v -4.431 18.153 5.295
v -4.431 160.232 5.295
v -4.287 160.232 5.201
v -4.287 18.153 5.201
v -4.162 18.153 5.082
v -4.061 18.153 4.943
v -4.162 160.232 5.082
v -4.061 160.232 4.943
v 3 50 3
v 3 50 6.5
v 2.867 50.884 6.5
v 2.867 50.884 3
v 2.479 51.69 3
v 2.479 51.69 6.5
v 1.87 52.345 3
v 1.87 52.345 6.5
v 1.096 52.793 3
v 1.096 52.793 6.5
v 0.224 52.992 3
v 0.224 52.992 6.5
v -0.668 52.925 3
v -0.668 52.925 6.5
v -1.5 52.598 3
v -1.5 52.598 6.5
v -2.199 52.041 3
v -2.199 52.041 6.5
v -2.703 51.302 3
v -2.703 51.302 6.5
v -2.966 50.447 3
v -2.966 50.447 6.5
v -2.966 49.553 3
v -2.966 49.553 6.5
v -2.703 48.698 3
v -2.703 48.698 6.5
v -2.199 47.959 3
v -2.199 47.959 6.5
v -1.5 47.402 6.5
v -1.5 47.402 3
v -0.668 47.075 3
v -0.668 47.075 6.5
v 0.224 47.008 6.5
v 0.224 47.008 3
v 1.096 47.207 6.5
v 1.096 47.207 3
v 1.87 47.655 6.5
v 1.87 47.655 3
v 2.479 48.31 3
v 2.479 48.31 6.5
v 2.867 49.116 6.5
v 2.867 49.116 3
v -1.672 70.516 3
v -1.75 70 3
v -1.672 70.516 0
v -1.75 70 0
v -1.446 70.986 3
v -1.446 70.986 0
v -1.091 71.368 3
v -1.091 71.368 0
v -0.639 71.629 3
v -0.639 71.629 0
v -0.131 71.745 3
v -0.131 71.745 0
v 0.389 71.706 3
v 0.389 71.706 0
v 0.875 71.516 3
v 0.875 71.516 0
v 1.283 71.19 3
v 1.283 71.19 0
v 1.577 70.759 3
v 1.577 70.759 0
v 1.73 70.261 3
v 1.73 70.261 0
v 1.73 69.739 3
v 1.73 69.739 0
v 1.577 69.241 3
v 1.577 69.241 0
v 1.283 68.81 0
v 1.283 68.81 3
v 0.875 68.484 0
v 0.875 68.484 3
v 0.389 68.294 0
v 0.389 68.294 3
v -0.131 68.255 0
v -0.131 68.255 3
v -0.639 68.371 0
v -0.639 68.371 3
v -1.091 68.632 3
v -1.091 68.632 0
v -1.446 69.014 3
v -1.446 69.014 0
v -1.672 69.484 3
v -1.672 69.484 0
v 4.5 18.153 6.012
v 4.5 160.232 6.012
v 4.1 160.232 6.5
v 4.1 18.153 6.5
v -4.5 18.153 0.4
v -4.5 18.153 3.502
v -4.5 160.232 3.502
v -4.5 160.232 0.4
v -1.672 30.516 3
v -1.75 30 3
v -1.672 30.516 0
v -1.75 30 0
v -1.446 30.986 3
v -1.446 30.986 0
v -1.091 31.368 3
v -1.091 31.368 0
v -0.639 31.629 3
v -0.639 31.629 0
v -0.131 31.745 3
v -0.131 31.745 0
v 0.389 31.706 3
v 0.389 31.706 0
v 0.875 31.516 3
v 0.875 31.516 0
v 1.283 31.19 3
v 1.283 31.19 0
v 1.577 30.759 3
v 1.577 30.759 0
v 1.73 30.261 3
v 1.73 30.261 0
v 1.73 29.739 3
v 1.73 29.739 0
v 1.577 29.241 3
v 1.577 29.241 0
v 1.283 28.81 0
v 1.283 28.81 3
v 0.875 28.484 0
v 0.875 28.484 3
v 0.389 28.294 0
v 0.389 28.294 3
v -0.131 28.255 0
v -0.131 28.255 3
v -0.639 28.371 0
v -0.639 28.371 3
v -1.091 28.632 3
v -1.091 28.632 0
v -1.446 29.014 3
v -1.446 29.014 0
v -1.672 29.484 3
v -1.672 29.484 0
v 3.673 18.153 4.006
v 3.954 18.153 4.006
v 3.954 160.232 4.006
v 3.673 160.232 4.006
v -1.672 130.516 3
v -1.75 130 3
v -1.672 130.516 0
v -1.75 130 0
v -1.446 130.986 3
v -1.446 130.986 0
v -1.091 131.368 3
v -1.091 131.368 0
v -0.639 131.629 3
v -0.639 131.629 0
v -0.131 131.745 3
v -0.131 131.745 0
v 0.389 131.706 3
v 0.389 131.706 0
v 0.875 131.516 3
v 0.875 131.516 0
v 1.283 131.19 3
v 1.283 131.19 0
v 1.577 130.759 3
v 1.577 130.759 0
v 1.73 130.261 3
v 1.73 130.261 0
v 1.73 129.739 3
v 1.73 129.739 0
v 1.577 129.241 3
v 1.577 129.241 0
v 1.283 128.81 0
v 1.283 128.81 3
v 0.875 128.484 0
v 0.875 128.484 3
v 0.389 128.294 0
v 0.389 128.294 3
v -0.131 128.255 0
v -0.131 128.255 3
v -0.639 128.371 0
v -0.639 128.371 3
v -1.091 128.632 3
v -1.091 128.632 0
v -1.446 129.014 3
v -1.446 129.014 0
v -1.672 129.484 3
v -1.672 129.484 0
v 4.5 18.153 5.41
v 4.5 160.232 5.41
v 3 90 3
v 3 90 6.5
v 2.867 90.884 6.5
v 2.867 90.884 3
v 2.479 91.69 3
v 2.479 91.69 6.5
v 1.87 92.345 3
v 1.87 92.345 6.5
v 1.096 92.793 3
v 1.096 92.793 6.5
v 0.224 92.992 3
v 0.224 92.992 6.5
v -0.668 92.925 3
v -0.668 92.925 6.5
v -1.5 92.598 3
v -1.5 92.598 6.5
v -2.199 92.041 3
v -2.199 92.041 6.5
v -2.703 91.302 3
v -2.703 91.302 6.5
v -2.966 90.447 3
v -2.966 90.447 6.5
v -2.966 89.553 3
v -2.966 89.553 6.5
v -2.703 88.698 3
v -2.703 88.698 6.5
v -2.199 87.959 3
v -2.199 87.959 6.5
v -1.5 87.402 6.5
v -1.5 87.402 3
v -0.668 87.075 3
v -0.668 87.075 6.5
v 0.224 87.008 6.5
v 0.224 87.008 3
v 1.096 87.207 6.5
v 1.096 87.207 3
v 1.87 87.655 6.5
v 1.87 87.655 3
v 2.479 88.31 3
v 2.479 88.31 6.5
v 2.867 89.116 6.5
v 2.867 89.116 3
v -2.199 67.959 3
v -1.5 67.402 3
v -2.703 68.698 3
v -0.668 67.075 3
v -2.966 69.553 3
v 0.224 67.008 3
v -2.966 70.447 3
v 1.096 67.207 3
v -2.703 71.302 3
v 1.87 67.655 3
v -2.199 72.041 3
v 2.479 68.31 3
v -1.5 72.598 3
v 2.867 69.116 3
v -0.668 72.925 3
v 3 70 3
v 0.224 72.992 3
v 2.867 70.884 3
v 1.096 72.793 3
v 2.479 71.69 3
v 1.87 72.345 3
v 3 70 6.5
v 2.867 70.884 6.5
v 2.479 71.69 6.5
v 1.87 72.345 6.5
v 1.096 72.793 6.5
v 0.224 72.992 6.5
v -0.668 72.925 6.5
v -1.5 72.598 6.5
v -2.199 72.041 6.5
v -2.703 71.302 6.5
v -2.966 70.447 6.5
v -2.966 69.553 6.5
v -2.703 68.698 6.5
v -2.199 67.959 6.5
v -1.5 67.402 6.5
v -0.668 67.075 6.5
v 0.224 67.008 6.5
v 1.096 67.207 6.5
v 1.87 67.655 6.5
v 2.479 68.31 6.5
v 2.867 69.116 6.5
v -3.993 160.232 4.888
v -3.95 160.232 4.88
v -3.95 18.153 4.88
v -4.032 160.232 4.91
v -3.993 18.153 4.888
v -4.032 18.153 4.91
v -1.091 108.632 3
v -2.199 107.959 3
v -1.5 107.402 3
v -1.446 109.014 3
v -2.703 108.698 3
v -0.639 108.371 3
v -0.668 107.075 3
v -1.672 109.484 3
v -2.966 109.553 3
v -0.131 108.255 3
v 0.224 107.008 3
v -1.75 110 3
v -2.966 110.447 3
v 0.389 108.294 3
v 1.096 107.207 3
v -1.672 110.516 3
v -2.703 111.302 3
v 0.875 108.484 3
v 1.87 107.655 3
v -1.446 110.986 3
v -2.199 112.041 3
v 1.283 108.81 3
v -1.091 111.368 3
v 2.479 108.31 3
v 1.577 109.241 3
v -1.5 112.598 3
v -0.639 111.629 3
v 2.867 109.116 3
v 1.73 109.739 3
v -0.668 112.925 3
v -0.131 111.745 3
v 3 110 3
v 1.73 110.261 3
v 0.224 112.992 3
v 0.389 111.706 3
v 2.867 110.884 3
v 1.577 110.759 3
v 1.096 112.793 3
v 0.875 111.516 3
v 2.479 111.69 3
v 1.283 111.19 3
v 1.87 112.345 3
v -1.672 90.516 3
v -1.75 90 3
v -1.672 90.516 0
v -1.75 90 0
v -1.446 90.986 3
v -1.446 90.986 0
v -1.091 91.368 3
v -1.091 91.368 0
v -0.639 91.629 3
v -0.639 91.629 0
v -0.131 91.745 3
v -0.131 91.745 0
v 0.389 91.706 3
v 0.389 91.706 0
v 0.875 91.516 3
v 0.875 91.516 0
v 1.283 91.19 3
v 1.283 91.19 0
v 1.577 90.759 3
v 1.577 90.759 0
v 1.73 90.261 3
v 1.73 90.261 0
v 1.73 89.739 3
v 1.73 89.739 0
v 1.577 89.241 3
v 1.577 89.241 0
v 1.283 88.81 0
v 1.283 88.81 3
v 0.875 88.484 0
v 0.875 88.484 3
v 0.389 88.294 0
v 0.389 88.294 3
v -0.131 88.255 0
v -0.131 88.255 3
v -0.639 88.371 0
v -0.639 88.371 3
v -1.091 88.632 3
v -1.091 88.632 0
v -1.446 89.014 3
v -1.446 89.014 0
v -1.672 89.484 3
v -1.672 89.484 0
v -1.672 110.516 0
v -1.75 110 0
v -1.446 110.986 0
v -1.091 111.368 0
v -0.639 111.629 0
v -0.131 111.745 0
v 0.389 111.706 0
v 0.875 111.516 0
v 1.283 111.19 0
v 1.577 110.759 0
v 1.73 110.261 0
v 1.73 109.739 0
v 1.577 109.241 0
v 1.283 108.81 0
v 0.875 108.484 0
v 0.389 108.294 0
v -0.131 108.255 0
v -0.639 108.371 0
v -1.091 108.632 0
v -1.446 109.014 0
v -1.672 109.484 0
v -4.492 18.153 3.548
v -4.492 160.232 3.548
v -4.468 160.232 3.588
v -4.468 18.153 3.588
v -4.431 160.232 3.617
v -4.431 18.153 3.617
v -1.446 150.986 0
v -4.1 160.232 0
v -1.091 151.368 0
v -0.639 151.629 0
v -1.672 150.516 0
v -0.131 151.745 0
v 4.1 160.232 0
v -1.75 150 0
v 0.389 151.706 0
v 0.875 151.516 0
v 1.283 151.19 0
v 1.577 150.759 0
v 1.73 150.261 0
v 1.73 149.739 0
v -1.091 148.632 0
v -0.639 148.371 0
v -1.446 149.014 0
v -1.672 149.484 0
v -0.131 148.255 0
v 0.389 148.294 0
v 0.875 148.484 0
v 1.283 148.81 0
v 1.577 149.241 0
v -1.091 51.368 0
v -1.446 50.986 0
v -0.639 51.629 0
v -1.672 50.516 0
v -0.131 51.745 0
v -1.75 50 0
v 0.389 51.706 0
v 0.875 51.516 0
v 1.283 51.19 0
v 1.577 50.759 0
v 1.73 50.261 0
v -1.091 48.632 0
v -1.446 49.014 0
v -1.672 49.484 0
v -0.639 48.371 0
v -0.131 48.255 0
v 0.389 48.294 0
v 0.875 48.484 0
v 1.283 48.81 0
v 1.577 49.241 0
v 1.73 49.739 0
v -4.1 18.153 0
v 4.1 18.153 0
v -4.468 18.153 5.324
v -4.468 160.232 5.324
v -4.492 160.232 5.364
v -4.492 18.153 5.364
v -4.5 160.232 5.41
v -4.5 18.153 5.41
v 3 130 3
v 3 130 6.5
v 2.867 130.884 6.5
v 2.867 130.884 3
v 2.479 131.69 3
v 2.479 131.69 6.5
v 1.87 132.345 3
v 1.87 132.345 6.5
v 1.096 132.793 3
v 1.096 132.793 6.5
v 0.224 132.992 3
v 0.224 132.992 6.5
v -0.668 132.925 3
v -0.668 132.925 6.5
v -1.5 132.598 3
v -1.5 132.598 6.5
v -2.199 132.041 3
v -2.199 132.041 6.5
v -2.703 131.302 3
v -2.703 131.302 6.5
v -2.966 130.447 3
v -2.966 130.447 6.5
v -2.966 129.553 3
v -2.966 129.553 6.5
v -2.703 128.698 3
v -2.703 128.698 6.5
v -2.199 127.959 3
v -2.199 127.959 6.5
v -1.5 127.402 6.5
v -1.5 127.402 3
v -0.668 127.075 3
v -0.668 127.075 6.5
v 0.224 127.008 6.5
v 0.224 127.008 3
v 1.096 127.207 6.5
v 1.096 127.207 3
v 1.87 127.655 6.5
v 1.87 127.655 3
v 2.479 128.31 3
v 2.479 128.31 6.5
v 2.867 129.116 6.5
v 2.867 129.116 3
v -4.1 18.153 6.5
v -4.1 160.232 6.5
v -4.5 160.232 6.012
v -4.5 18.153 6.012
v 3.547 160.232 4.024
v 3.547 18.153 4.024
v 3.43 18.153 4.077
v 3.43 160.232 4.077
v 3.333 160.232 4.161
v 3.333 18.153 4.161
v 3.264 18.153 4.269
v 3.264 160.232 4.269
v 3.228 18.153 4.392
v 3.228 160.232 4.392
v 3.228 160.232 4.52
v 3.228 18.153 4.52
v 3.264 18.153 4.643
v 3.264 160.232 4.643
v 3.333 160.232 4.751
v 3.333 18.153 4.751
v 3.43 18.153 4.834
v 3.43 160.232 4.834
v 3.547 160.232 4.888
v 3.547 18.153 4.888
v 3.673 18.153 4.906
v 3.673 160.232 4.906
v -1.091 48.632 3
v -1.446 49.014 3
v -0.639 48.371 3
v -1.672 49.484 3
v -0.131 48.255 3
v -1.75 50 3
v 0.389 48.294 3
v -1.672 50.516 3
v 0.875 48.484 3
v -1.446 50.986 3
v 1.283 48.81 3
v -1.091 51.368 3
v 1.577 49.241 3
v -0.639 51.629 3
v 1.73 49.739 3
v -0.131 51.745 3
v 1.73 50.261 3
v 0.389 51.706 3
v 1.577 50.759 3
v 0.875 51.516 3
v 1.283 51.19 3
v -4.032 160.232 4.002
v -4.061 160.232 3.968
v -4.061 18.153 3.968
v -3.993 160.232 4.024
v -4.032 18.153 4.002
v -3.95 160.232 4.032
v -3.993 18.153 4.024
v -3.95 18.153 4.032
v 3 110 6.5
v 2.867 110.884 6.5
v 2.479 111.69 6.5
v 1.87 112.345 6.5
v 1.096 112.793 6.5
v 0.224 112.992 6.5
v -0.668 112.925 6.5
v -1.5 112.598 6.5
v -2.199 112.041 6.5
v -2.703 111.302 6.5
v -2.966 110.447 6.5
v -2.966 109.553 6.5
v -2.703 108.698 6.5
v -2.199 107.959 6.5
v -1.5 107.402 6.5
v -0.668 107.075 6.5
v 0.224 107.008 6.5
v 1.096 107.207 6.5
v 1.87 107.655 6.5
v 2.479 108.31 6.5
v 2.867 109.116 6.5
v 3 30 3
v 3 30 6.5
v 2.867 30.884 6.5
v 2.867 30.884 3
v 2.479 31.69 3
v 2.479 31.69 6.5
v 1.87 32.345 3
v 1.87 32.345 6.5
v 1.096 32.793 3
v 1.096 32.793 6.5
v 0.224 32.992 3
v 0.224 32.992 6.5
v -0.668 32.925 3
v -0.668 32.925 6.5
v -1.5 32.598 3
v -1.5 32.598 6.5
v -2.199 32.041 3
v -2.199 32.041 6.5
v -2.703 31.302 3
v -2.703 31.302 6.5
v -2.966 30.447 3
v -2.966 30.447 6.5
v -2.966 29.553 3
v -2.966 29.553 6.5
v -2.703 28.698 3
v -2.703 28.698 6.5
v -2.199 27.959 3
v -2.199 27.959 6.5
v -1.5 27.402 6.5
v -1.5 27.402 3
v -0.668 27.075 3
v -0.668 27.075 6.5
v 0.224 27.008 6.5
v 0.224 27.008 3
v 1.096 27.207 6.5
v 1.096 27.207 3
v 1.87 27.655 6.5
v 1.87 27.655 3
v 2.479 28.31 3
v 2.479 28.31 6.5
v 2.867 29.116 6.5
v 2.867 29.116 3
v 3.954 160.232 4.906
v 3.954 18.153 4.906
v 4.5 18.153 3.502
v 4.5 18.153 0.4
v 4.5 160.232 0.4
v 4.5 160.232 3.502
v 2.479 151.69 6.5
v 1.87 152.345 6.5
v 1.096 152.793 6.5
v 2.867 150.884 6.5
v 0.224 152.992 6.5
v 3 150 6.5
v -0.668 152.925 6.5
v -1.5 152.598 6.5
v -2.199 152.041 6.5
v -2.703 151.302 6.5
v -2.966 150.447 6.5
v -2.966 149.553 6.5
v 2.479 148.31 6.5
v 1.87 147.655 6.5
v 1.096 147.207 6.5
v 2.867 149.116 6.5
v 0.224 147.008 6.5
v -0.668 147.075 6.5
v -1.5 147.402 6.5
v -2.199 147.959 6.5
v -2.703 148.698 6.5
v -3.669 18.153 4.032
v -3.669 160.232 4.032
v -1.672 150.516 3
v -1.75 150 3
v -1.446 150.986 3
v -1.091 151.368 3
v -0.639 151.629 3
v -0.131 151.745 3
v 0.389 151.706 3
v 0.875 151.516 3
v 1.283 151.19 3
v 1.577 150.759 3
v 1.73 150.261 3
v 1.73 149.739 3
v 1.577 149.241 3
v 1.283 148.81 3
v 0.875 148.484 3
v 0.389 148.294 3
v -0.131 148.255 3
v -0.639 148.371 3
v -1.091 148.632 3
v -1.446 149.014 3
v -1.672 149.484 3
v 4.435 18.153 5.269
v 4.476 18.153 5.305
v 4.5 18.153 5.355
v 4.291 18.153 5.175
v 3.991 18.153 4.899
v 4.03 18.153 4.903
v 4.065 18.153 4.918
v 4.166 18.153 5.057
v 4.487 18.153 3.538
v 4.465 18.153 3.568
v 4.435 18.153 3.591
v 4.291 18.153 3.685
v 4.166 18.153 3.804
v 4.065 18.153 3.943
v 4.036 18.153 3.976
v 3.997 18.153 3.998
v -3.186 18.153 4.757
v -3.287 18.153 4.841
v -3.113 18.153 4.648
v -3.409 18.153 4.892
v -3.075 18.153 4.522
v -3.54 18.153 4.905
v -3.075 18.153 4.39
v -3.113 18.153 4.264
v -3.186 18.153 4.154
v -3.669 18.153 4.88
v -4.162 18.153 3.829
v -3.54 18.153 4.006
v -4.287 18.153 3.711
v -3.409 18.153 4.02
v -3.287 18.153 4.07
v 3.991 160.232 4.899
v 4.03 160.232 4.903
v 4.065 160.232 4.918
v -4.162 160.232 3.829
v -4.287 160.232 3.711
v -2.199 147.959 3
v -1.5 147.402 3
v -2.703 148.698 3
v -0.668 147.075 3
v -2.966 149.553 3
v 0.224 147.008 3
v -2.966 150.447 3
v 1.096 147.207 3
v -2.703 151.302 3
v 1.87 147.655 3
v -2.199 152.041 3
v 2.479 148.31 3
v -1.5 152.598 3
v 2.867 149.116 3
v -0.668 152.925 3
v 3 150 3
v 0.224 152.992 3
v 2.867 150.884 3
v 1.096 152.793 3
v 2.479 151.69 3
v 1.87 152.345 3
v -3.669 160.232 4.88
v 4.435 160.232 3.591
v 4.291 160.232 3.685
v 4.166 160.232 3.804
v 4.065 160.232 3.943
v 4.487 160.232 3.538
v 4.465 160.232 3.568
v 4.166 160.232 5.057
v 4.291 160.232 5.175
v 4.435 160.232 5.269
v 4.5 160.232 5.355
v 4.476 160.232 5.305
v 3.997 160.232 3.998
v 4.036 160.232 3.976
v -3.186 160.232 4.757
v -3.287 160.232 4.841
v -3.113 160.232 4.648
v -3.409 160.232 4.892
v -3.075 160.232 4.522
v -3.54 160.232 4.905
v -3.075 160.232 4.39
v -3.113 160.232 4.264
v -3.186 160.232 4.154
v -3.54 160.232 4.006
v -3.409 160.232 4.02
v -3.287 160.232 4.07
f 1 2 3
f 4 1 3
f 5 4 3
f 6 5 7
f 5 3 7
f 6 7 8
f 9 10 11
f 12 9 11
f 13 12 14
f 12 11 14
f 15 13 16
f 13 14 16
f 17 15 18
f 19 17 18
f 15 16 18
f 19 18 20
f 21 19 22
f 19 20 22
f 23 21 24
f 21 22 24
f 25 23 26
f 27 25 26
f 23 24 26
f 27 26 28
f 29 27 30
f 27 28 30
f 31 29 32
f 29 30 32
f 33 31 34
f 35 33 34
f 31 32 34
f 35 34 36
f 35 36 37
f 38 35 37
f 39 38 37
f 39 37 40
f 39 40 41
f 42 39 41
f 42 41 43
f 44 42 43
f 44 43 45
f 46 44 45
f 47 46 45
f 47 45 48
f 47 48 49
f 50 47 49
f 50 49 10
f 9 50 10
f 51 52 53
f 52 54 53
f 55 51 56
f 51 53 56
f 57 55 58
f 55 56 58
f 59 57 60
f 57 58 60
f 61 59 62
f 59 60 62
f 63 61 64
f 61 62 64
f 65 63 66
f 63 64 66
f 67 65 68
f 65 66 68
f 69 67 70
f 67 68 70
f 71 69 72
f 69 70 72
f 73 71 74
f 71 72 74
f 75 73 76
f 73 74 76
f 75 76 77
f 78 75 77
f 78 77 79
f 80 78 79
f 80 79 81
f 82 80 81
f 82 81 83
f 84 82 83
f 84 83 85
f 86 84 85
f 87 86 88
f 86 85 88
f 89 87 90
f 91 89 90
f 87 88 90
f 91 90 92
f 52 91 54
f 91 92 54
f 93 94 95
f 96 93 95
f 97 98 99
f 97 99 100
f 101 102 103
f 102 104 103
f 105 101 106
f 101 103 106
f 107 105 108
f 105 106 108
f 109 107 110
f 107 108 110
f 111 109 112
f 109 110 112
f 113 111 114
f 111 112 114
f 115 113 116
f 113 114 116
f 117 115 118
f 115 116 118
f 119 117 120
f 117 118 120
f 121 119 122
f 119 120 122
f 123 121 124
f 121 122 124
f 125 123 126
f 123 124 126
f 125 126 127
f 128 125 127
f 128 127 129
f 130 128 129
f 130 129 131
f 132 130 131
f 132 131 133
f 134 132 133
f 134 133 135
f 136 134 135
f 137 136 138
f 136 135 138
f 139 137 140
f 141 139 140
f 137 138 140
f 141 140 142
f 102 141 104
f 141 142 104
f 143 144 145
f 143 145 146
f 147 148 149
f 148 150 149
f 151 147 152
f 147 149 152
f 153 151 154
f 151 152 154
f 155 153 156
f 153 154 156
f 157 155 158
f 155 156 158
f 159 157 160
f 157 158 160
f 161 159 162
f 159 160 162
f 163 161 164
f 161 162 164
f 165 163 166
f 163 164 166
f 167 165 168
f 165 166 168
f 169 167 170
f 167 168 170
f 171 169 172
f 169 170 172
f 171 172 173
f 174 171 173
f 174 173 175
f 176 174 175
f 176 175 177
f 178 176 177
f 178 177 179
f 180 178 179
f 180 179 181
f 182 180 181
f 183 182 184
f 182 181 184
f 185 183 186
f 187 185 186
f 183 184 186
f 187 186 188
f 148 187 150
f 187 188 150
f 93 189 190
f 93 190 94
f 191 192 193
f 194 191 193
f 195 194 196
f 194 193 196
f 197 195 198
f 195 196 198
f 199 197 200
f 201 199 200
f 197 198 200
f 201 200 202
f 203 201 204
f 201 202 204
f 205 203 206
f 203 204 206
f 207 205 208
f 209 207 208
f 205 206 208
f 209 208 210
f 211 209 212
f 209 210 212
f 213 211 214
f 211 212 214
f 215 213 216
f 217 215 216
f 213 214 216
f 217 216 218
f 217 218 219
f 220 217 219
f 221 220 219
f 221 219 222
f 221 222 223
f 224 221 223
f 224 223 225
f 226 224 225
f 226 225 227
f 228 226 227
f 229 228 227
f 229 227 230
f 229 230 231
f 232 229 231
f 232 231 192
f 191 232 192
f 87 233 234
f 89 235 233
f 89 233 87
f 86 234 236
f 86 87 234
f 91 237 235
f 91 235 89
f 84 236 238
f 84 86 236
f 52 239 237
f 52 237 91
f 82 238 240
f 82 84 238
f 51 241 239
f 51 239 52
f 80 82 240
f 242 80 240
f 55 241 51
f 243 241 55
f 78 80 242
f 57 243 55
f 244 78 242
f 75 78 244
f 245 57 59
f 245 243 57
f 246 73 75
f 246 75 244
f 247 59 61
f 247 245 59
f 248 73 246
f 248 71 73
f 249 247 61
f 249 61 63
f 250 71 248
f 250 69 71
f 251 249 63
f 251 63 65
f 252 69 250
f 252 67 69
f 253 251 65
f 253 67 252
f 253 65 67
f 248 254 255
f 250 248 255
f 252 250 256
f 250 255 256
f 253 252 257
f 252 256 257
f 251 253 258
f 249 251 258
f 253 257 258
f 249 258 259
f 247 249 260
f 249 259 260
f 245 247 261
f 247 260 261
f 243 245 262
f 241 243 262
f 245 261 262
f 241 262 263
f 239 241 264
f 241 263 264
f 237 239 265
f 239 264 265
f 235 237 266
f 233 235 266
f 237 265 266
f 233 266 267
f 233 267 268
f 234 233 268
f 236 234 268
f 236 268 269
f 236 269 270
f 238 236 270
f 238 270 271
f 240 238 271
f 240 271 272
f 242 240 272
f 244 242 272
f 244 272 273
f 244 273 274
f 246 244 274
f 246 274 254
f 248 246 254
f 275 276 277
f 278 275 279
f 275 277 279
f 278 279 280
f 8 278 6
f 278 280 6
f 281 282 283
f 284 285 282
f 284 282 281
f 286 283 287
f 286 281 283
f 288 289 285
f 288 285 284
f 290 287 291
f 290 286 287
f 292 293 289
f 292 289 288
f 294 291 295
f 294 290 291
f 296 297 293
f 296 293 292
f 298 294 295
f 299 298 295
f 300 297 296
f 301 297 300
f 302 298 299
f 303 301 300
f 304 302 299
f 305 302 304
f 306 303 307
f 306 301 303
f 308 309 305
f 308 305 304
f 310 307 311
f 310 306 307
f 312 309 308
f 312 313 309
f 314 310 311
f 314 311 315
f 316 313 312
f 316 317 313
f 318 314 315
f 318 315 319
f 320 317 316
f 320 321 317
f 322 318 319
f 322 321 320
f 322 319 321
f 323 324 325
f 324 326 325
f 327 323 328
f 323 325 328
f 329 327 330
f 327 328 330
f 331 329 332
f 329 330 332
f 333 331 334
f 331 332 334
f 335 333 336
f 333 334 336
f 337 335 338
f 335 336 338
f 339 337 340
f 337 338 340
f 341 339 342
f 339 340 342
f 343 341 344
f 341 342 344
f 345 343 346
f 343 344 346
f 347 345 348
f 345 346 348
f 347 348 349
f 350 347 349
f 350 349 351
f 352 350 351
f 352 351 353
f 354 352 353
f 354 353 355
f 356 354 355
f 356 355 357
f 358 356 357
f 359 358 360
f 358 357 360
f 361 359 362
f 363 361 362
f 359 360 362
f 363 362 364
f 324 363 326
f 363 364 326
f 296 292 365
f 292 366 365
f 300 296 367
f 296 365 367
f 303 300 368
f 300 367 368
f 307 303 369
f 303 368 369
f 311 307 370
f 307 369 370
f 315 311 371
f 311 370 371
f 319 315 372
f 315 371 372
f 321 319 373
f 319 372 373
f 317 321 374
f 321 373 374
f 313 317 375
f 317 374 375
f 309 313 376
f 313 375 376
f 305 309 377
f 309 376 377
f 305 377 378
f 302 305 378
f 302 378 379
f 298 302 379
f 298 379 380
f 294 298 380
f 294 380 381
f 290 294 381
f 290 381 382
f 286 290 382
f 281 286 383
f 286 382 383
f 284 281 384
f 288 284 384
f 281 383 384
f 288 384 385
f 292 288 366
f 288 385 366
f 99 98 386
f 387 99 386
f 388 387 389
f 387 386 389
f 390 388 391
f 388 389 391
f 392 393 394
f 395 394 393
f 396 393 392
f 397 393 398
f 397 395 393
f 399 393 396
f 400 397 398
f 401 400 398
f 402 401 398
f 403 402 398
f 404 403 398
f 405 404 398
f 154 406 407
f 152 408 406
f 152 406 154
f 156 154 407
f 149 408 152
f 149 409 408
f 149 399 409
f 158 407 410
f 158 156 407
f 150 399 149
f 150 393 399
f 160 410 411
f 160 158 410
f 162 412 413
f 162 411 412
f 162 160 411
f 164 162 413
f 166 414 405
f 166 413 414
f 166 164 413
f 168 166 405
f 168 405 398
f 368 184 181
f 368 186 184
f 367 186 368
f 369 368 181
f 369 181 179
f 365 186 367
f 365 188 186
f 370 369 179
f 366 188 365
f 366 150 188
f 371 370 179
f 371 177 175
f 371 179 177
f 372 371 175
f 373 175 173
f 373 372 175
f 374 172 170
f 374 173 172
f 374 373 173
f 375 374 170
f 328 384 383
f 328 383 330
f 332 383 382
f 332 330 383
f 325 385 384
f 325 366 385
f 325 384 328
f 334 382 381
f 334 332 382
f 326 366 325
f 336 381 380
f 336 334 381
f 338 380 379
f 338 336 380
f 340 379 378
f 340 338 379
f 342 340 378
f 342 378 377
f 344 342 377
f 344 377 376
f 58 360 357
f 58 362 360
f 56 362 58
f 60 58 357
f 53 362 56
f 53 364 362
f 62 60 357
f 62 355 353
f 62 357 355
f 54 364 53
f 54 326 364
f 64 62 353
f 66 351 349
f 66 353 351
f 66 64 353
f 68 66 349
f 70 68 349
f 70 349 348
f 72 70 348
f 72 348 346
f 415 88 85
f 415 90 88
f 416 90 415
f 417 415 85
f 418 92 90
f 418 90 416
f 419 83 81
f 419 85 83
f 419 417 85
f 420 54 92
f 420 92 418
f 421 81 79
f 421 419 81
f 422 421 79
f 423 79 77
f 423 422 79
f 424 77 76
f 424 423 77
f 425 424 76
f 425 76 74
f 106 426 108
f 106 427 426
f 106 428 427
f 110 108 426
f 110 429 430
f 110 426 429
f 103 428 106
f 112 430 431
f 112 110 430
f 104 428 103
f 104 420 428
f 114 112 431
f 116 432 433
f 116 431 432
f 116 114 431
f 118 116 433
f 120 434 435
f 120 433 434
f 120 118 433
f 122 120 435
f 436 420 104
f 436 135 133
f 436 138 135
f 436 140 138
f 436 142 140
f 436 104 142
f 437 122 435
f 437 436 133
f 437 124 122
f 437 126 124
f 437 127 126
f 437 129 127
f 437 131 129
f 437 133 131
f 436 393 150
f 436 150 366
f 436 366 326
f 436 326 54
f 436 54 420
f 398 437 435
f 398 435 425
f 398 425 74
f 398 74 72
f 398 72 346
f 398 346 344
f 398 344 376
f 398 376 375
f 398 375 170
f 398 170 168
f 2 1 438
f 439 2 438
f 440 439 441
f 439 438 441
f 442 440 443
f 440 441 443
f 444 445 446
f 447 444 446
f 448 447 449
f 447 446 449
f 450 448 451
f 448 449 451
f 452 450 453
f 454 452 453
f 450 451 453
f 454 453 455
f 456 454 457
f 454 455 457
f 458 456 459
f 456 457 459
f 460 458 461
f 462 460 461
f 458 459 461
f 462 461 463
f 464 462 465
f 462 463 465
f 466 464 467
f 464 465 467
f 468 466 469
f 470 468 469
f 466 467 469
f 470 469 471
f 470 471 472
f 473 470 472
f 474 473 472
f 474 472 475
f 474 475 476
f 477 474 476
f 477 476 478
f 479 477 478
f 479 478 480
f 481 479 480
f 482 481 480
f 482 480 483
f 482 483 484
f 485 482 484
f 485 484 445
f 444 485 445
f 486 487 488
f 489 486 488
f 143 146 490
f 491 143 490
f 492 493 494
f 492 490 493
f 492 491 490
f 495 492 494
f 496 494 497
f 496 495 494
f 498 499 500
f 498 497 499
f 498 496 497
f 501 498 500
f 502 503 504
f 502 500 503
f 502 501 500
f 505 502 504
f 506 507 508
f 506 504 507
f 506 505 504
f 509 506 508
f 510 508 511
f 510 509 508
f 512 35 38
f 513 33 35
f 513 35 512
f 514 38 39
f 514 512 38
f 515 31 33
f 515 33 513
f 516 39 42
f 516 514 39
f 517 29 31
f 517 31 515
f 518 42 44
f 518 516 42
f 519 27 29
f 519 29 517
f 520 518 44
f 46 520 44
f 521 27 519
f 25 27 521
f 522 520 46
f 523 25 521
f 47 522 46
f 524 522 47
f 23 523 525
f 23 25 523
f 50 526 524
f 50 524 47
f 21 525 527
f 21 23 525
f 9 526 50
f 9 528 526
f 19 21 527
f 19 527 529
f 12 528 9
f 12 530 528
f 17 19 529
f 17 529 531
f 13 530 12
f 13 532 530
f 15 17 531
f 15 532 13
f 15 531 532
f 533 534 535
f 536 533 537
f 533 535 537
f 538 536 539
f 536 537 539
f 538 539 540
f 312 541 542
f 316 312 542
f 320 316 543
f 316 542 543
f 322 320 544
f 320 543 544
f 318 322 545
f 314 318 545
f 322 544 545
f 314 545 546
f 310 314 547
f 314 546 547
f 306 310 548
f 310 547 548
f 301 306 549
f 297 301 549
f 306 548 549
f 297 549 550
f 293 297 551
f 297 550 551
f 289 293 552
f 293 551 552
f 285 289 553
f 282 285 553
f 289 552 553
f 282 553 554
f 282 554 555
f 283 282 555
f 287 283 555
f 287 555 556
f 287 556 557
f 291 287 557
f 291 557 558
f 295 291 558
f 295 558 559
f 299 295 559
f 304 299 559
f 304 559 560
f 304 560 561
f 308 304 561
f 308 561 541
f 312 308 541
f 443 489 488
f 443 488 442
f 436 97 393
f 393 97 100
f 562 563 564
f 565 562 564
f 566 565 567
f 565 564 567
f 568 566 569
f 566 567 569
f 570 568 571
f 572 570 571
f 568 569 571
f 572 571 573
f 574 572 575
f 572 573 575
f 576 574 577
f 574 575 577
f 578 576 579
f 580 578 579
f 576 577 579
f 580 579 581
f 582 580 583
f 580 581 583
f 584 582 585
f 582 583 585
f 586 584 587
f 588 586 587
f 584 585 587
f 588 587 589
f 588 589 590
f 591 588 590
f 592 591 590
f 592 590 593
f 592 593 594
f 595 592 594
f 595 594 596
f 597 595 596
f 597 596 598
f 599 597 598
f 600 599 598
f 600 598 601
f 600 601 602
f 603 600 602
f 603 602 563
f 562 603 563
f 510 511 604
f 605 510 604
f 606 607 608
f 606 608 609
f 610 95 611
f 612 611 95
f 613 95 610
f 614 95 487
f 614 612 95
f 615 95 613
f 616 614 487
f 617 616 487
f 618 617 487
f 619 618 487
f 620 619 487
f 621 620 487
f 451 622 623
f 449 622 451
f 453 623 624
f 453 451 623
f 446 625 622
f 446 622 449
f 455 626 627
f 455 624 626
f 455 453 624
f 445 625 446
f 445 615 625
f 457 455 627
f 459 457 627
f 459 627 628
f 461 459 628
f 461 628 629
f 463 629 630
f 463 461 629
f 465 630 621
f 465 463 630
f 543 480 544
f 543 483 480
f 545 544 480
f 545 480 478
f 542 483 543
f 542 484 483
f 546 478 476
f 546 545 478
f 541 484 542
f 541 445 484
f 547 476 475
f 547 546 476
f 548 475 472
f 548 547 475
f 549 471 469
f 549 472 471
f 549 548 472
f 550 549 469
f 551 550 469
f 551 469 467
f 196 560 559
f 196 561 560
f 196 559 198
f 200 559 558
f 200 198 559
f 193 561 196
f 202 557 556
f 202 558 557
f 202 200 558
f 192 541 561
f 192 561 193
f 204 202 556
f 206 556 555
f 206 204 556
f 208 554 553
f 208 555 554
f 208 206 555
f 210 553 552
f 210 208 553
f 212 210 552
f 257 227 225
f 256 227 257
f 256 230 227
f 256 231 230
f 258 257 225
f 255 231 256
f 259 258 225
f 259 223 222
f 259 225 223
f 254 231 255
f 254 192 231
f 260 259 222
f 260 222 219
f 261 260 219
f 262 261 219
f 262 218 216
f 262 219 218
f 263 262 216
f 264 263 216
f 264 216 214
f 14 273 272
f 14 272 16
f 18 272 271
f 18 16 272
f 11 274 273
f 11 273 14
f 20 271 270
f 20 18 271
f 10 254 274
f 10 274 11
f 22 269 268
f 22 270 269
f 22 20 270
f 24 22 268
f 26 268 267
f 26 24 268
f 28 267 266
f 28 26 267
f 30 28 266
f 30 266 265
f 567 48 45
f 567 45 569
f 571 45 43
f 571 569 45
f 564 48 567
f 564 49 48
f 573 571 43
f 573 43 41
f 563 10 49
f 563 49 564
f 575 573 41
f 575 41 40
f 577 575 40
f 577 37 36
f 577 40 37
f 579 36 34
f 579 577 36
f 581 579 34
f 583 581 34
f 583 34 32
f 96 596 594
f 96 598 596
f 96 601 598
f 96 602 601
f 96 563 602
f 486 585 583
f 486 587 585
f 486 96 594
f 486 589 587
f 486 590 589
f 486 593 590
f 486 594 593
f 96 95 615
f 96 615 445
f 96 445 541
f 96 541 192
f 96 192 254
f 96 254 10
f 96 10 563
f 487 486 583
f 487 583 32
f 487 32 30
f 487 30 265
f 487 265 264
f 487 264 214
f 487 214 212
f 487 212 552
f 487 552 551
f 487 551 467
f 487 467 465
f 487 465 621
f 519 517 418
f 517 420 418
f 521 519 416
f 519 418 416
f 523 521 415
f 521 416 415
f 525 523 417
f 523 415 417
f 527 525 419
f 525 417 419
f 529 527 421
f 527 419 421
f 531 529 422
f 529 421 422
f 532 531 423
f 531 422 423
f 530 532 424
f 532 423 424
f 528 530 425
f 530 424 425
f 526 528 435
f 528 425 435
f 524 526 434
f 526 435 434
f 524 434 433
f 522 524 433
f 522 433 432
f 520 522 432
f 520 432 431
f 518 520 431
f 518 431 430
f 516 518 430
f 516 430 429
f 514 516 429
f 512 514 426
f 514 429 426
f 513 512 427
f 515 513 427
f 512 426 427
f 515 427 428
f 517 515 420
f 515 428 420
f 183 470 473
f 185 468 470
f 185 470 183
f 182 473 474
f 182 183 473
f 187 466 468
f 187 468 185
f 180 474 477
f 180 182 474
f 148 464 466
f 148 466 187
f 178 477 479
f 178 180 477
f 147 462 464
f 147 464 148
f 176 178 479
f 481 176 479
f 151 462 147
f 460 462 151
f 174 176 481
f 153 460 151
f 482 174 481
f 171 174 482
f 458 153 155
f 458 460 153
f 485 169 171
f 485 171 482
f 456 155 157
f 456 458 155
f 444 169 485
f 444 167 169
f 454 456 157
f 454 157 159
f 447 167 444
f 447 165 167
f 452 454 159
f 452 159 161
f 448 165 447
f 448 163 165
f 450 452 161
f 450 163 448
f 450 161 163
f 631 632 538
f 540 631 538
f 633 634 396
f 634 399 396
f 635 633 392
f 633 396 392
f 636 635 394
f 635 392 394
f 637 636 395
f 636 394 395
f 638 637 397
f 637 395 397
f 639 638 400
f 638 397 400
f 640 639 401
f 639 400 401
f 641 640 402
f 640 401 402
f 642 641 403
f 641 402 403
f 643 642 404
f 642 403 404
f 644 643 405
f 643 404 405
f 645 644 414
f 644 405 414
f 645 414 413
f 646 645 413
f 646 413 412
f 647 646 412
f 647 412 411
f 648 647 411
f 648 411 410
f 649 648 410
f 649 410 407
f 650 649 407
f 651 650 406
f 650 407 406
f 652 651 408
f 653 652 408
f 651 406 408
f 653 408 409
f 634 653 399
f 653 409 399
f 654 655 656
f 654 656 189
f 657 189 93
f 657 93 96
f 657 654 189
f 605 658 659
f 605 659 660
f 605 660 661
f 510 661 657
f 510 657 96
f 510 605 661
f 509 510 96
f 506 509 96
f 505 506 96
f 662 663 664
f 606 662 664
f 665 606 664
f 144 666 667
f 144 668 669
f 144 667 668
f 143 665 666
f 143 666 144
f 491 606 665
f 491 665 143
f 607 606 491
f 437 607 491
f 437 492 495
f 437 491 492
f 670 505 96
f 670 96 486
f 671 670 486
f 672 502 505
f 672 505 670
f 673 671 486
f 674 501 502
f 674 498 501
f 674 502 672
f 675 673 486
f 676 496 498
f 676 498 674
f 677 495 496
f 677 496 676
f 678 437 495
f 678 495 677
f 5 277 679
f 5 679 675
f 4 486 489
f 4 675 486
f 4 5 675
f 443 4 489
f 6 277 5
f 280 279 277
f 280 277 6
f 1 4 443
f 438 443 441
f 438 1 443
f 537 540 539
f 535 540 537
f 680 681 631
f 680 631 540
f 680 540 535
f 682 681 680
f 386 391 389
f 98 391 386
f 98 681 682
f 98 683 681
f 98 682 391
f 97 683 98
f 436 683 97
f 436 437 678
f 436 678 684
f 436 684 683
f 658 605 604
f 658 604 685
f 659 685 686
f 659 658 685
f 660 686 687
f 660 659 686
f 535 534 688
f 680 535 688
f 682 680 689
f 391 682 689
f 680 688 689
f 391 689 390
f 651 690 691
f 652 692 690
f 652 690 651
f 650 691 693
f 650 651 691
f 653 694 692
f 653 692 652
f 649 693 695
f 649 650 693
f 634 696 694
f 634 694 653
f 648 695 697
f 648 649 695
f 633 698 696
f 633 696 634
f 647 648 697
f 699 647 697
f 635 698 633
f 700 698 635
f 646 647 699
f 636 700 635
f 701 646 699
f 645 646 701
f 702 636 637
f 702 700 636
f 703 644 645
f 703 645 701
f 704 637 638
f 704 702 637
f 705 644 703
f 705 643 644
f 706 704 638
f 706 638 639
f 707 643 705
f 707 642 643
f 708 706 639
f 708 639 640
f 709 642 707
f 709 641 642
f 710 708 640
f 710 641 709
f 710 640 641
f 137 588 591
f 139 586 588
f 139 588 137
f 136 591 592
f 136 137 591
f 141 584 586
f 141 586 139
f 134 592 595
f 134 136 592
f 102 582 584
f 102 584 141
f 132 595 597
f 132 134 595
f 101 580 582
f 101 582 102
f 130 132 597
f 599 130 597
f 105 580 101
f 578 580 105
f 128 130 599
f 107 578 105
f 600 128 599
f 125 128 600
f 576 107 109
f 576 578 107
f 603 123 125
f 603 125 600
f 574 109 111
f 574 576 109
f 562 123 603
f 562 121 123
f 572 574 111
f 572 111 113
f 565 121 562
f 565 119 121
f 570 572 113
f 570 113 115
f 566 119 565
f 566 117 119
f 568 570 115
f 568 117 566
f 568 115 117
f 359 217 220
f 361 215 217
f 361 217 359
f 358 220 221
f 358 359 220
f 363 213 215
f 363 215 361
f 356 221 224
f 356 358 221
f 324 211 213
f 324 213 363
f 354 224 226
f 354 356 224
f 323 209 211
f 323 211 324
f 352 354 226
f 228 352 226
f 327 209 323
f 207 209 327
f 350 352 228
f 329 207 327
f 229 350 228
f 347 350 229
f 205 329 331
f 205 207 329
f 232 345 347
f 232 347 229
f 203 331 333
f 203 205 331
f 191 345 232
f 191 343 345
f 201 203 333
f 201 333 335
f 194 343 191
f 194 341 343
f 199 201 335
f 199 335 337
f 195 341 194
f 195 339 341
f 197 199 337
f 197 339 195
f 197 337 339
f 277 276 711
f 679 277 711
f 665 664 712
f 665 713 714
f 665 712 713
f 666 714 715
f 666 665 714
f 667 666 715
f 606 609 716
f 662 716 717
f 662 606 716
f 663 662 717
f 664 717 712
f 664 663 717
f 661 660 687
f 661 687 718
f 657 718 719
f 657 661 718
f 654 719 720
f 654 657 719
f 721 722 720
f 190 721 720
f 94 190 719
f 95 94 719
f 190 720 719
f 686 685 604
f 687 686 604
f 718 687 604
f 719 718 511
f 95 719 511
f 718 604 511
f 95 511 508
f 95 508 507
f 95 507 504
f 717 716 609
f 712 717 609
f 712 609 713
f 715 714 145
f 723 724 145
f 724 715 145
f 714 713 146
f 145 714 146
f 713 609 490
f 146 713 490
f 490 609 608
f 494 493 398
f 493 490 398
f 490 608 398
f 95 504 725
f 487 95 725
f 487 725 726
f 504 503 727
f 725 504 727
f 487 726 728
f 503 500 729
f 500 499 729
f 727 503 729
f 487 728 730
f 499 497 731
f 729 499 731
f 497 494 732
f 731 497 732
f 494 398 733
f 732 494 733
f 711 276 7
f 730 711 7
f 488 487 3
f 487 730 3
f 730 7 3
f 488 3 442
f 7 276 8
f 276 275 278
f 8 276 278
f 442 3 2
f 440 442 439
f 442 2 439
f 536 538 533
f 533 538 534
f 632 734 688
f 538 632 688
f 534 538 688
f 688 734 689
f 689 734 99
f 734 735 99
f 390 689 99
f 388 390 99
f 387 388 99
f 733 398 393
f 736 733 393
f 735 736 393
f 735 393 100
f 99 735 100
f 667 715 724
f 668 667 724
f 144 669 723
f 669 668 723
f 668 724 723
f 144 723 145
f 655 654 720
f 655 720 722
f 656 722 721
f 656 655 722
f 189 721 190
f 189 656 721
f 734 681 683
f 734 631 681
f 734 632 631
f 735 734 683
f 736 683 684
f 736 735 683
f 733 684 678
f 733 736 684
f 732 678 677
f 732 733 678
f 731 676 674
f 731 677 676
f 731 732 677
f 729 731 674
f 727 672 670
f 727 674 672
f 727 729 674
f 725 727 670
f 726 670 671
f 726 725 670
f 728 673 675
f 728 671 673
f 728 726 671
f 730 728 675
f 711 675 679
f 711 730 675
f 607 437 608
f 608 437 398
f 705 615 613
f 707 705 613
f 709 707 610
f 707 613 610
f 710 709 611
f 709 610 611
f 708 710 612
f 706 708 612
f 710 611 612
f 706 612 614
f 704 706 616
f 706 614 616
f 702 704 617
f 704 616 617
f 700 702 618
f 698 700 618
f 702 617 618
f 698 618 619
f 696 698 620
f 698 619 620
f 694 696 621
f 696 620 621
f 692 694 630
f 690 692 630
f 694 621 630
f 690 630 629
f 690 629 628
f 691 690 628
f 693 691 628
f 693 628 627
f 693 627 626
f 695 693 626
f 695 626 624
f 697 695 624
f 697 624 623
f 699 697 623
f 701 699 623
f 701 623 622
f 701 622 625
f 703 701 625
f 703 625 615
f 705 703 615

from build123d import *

# Parameters (mm, degrees)
RESSALTO_EXTRUS_O1_DEPTH                             = 1000
CORTE_EXTRUS_O1_START                                = -1000
CORTE_EXTRUS_O1_DEPTH                                = 1000
CORTE_EXTRUS_O2_DEPTH                                = 1001.031261626
CORTE_EXTRUS_O3_DEPTH                                = 1001.031261626
CORTE_EXTRUS_O4_DEPTH                                = 1001.031261626
CORTE_EXTRUS_O5_DEPTH                                = 0.002166667
CORTE_EXTRUS_O6_DEPTH                                = 0.002166667
CORTE_EXTRUS_O7_DEPTH                                = 0.002166667
CORTE_EXTRUS_O8_DEPTH                                = 0.002166667
INCLINA_O1_ANGLE                                     = 45.1469538
ESBO_O10_W                                           = 0.450000001
ESBO_O10_H                                           = 1000
REBAIXO_PARA_PARAFUSO_DE_M_QUINA_DE_CABE_D           = 3.5
REBAIXO_PARA_PARAFUSO_DE_M_QUINA_DE_CABE_CBORE_D     = 6
REBAIXO_PARA_PARAFUSO_DE_M_QUINA_DE_CABE_CBORE_DEPTH = 3.50000002
CHANFRO1_SIZE                                        = 0.062563219
CHANFRO1_SIZE2                                       = 0.062205617
CHANFRO3_START                                       = -3.730761794
CHANFRO3_DEPTH                                       = 0.399013115
CHANFRO4_SIZE                                        = 0.4
FILETE1_R                                            = 0.130000023
SKETCH1_W                                            = 36.072768502
SKETCH1_H                                            = 858.120887339
SKETCH1_W_2                                          = 21.632087489
SKETCH1_H_2                                          = 62.411000867
CUT_EXTRUDE1_DEPTH                                   = 10


with BuildPart() as part:
    # Esboço1 → Ressalto-extrusão1 (new body)
    with BuildSketch(Plane.XZ):
        with BuildLine():
            Line((4.5, 5.4097155), (4.5, 6.01167813))
            Line((4.5, 6.01167813), (4.1, 6.50000002))
            Line((4.1, 6.50000002), (-4.1, 6.50000002))
            Line((-4.1, 6.50000002), (-4.5, 6.01167813))
            Line((-4.5, 6.01167813), (-4.5, 2e-08))
            Line((-4.5, 2e-08), (4.5, 2e-08))
            Line((4.5, 2e-08), (4.5, 3.50196265))
            ThreePointArc((4.5, 3.50196265), (4.477413879, 3.553810372), (4.43494978, 3.59116167))
            ThreePointArc((4.43494978, 3.59116167), (3.930462682, 4.43021964), (4.43494978, 5.26927761))
            ThreePointArc((4.43494978, 5.26927761), (4.490651601, 5.328761203), (4.5, 5.4097155))
        make_face()
    extrude(amount=-RESSALTO_EXTRUS_O1_DEPTH)

    # Esboço2 → Corte-extrusão1 (cut)
    with BuildSketch(Plane(origin=(0, 1000, 0), x_dir=(-1, 0, 0), z_dir=(0, 1, 0)).offset(CORTE_EXTRUS_O1_START)):
        with BuildLine():
            Line((-4.030498711, 4.00588336), (-3.673447948, 4.00588336))
            ThreePointArc((-3.673447948, 4.00588336), (-3.223447946, 4.455883362), (-3.673447948, 4.905883363))
            Line((-3.673447948, 4.905883363), (-3.953580008, 4.905883363))
            ThreePointArc((-3.953580008, 4.905883363), (-4.010719931, 4.899199784), (-4.065149208, 4.917830263))
            ThreePointArc((-4.065149208, 4.917830263), (-3.93114763, 4.466290066), (-4.030498711, 4.00588336))
        make_face()
    extrude(amount=CORTE_EXTRUS_O1_DEPTH, mode=Mode.SUBTRACT)

    # Esboço3 → Corte-extrusão2 (cut, through all)
    with BuildSketch(Plane(origin=(0, 1000, 0), x_dir=(-1, 0, 0), z_dir=(0, 1, 0))):
        with BuildLine():
            Line((4.5, 4.03150278), (4.5, 4.88017535))
            Line((4.5, 4.88017535), (3.66946318, 4.88017535))
            ThreePointArc((3.66946318, 4.88017535), (3.969667593, 4.455839065), (3.66946318, 4.03150278))
            Line((3.66946318, 4.03150278), (4.5, 4.03150278))
        make_face()
    extrude(amount=-CORTE_EXTRUS_O2_DEPTH, mode=Mode.SUBTRACT)

    # Esboço4 → Corte-extrusão3 (cut, through all)
    with BuildSketch(Plane(origin=(0, 1000, 0), x_dir=(-1, 0, 0), z_dir=(0, 1, 0))):
        with BuildLine():
            Line((4.026513974, 4.88017535), (4.5, 4.88017535))
            Line((4.5, 4.88017535), (4.5, 5.328056964))
            ThreePointArc((4.5, 5.328056964), (4.223646078, 5.145991535), (4.026513974, 4.88017535))
        make_face()
    extrude(amount=-CORTE_EXTRUS_O3_DEPTH, mode=Mode.SUBTRACT)

    # Esboço5 → Corte-extrusão4 (cut, through all)
    with BuildSketch(Plane(origin=(0, 1000, 0), x_dir=(-1, 0, 0), z_dir=(0, 1, 0))):
        with BuildLine():
            Line((4.5, 3.583620931), (4.5, 4.03150278))
            Line((4.5, 4.03150278), (4.026513856, 4.03150278))
            ThreePointArc((4.026513856, 4.03150278), (4.223645982, 3.76568645), (4.5, 3.583620931))
        make_face()
    extrude(amount=-CORTE_EXTRUS_O4_DEPTH, mode=Mode.SUBTRACT)

    # Esboço6 → Corte-extrusão5 (cut)
    with BuildSketch(Plane(origin=(0, 1000, 0), x_dir=(-1, 0, 0), z_dir=(0, 1, 0))):
        Polygon((0.891369267, 3.403698133), (0.714701433, 3.168235633), (0.2187042, 2.61105), (1.0945792, 2.61105), (1.0945792, 2.695983333), (0.398689633, 2.695983333), (0.794326433, 3.149466667), (0.9743123, 3.3891), (1.067110588, 3.573407857), (0.95413722, 3.802321701), (0.7876908, 3.88505), (0.54301, 3.88505), (0.375434678, 3.803592619), (0.295011167, 3.6384023), (0.295011167, 3.562), (0.3812718, 3.562), (0.3812718, 3.631766667), (0.437672733, 3.743620833), (0.549645633, 3.800116667), (0.7802262, 3.800116667), (0.893028067, 3.743810633), (0.976240026, 3.576039029), align=None)
    extrude(amount=-CORTE_EXTRUS_O5_DEPTH, mode=Mode.SUBTRACT)

    # Esboço7 → Corte-extrusão6 (cut)
    with BuildSketch(Plane.XZ):
        Polygon((-0.214632167, 3.88505), (-0.953983333, 3.88505), (-0.953983333, 2.61105), (-0.214632167, 2.61105), (-0.214632167, 2.695983333), (-0.86905, 2.695983333), (-0.86905, 3.205583333), (-0.5123963, 3.205583333), (-0.5123963, 3.290516667), (-0.86905, 3.290516667), (-0.86905, 3.800116667), (-0.214632167, 3.800116667), align=None)
    extrude(amount=-CORTE_EXTRUS_O6_DEPTH, mode=Mode.SUBTRACT)

    # Esboço8 → Corte-extrusão7 (cut)
    with BuildSketch(Plane(origin=(0, 1000, 0), x_dir=(-1, 0, 0), z_dir=(0, 1, 0))):
        Polygon((-0.214632167, 3.88505), (-0.953983333, 3.88505), (-0.953983333, 2.61105), (-0.214632167, 2.61105), (-0.214632167, 2.695983333), (-0.86905, 2.695983333), (-0.86905, 3.205583333), (-0.5123963, 3.205583333), (-0.5123963, 3.290516667), (-0.86905, 3.290516667), (-0.86905, 3.800116667), (-0.214632167, 3.800116667), align=None)
    extrude(amount=-CORTE_EXTRUS_O7_DEPTH, mode=Mode.SUBTRACT)

    # Esboço9 → Corte-extrusão8 (cut)
    with BuildSketch(Plane.XZ):
        Polygon((0.510057167, 3.620830633), (0.6071, 3.718655633), (0.6071, 2.609403333), (0.692033333, 2.609403333), (0.692033333, 3.883403333), (0.6741176, 3.883403333), (0.6741176, 3.795069794), (0.3690544, 3.640736667), (0.3690544, 3.551253333), align=None)
    extrude(amount=-CORTE_EXTRUS_O8_DEPTH, mode=Mode.SUBTRACT)

    # Inclinação1
    inclina_o1_faces = [part.faces().sort_by_distance(p)[0] for p in [
        (0.6741176, 0.001083333, 3.839236564),
    ]]
    draft(inclina_o1_faces, Plane(origin=(0.692033333, 0.002166667, 3.883403333), x_dir=(-1, 0, 0), z_dir=(0, 0, -1)), INCLINA_O1_ANGLE)

    # Esboço10 → Corte-Revolução1 (revolve, cut)
    with BuildSketch(Plane.XY.offset(4.455839065)):
        with Locations((-3.294667591, 500)):
            Rectangle(ESBO_O10_W, ESBO_O10_H)
    revolve(axis=Axis((-3.519667591, 1000, 4.455839065), (0, -1, 0)), mode=Mode.SUBTRACT)

    # Rebaixo para parafuso de máquina de cabeça sextavada de M31 (through all)
    with Locations(Plane.XY.offset(6.50000002)):
        with Locations((0, 990), (0, 970), (0, 950), (0, 930), (0, 910), (0, 890), (0, 870), (0, 850), (0, 830), (0, 810), (0, 790), (0, 770), (0, 750), (0, 730), (0, 710), (0, 690), (0, 670), (0, 650), (0, 630), (0, 610), (0, 590), (0, 570), (0, 550), (0, 530), (0, 510), (0, 490), (0, 470), (0, 450), (0, 430), (0, 410), (0, 390), (0, 370), (0, 350), (0, 330), (0, 310), (0, 290), (0, 270), (0, 250), (0, 230), (0, 210), (0, 190), (0, 170), (0, 150), (0, 130), (0, 110), (0, 90), (0, 70), (0, 50), (0, 30), (0, 10)):
            CounterBoreHole(REBAIXO_PARA_PARAFUSO_DE_M_QUINA_DE_CABE_D / 2, REBAIXO_PARA_PARAFUSO_DE_M_QUINA_DE_CABE_CBORE_D / 2, REBAIXO_PARA_PARAFUSO_DE_M_QUINA_DE_CABE_CBORE_DEPTH)

    # Chanfro1
    chanfro1_edges = [part.edges().sort_by_distance(p)[0] for p in [
        (-0.976240026, 999.998916667, 3.576039029),
    ]]
    chanfro1_side = [part.faces().sort_by_distance(p)[0] for p in [
        (-0.933804646, 999.998916667, 3.489868581),
    ]]
    chamfer(chanfro1_edges, length=CHANFRO1_SIZE, length2=CHANFRO1_SIZE2, reference=chanfro1_side[0])

    # Chanfro3: read off the stored shape, not the designer's step
    # Chanfro3 outline → Chanfro3 (add)
    with BuildSketch(Plane(origin=(0, 0, 0), x_dir=(0.8991051825477068, 0, 0.43773264753254887), z_dir=(0.4377326475325489, 0, -0.8991051825477069)).offset(CHANFRO3_START)):
        Polygon((1.327401403, -999.997833333), (1.31122788, -999.997833333), (1.311999664, -1000), (1.327401403, -1000), align=None)
    extrude(amount=CHANFRO3_DEPTH)

    # Chanfro4
    chanfro4_edges = [part.edges().sort_by_distance(p)[0] for p in [
        (4.5, 500, 2e-08),
        (-4.5, 500, 2e-08),
    ]]
    chamfer(chanfro4_edges, length=CHANFRO4_SIZE)

    # Filete1
    filete1_edges = [part.edges().sort_by_distance(p)[0] for p in [
        (4.030498711, 500, 4.00588336),
        (-4.026513974, 500, 4.88017535),
        (-4.5, 500, 5.328056964),
        (-4.5, 500, 3.583620931),
        (-4.026513856, 500, 4.03150278),
    ]]
    fillet(filete1_edges, radius=FILETE1_R)

    # Sketch1 → Cut-Extrude1 (cut)
    with BuildSketch(Plane(origin=(0, 0, 0), x_dir=(-1, 0, 0), z_dir=(0, 0, -1))):
        with Locations((-9.39117436, 589.29269367)):
            Rectangle(SKETCH1_W, SKETCH1_H)
        with Locations((0.25600221, -13.052857141)):
            Rectangle(SKETCH1_W_2, SKETCH1_H_2)
    extrude(amount=-CUT_EXTRUDE1_DEPTH, mode=Mode.SUBTRACT)


solid = part.part
